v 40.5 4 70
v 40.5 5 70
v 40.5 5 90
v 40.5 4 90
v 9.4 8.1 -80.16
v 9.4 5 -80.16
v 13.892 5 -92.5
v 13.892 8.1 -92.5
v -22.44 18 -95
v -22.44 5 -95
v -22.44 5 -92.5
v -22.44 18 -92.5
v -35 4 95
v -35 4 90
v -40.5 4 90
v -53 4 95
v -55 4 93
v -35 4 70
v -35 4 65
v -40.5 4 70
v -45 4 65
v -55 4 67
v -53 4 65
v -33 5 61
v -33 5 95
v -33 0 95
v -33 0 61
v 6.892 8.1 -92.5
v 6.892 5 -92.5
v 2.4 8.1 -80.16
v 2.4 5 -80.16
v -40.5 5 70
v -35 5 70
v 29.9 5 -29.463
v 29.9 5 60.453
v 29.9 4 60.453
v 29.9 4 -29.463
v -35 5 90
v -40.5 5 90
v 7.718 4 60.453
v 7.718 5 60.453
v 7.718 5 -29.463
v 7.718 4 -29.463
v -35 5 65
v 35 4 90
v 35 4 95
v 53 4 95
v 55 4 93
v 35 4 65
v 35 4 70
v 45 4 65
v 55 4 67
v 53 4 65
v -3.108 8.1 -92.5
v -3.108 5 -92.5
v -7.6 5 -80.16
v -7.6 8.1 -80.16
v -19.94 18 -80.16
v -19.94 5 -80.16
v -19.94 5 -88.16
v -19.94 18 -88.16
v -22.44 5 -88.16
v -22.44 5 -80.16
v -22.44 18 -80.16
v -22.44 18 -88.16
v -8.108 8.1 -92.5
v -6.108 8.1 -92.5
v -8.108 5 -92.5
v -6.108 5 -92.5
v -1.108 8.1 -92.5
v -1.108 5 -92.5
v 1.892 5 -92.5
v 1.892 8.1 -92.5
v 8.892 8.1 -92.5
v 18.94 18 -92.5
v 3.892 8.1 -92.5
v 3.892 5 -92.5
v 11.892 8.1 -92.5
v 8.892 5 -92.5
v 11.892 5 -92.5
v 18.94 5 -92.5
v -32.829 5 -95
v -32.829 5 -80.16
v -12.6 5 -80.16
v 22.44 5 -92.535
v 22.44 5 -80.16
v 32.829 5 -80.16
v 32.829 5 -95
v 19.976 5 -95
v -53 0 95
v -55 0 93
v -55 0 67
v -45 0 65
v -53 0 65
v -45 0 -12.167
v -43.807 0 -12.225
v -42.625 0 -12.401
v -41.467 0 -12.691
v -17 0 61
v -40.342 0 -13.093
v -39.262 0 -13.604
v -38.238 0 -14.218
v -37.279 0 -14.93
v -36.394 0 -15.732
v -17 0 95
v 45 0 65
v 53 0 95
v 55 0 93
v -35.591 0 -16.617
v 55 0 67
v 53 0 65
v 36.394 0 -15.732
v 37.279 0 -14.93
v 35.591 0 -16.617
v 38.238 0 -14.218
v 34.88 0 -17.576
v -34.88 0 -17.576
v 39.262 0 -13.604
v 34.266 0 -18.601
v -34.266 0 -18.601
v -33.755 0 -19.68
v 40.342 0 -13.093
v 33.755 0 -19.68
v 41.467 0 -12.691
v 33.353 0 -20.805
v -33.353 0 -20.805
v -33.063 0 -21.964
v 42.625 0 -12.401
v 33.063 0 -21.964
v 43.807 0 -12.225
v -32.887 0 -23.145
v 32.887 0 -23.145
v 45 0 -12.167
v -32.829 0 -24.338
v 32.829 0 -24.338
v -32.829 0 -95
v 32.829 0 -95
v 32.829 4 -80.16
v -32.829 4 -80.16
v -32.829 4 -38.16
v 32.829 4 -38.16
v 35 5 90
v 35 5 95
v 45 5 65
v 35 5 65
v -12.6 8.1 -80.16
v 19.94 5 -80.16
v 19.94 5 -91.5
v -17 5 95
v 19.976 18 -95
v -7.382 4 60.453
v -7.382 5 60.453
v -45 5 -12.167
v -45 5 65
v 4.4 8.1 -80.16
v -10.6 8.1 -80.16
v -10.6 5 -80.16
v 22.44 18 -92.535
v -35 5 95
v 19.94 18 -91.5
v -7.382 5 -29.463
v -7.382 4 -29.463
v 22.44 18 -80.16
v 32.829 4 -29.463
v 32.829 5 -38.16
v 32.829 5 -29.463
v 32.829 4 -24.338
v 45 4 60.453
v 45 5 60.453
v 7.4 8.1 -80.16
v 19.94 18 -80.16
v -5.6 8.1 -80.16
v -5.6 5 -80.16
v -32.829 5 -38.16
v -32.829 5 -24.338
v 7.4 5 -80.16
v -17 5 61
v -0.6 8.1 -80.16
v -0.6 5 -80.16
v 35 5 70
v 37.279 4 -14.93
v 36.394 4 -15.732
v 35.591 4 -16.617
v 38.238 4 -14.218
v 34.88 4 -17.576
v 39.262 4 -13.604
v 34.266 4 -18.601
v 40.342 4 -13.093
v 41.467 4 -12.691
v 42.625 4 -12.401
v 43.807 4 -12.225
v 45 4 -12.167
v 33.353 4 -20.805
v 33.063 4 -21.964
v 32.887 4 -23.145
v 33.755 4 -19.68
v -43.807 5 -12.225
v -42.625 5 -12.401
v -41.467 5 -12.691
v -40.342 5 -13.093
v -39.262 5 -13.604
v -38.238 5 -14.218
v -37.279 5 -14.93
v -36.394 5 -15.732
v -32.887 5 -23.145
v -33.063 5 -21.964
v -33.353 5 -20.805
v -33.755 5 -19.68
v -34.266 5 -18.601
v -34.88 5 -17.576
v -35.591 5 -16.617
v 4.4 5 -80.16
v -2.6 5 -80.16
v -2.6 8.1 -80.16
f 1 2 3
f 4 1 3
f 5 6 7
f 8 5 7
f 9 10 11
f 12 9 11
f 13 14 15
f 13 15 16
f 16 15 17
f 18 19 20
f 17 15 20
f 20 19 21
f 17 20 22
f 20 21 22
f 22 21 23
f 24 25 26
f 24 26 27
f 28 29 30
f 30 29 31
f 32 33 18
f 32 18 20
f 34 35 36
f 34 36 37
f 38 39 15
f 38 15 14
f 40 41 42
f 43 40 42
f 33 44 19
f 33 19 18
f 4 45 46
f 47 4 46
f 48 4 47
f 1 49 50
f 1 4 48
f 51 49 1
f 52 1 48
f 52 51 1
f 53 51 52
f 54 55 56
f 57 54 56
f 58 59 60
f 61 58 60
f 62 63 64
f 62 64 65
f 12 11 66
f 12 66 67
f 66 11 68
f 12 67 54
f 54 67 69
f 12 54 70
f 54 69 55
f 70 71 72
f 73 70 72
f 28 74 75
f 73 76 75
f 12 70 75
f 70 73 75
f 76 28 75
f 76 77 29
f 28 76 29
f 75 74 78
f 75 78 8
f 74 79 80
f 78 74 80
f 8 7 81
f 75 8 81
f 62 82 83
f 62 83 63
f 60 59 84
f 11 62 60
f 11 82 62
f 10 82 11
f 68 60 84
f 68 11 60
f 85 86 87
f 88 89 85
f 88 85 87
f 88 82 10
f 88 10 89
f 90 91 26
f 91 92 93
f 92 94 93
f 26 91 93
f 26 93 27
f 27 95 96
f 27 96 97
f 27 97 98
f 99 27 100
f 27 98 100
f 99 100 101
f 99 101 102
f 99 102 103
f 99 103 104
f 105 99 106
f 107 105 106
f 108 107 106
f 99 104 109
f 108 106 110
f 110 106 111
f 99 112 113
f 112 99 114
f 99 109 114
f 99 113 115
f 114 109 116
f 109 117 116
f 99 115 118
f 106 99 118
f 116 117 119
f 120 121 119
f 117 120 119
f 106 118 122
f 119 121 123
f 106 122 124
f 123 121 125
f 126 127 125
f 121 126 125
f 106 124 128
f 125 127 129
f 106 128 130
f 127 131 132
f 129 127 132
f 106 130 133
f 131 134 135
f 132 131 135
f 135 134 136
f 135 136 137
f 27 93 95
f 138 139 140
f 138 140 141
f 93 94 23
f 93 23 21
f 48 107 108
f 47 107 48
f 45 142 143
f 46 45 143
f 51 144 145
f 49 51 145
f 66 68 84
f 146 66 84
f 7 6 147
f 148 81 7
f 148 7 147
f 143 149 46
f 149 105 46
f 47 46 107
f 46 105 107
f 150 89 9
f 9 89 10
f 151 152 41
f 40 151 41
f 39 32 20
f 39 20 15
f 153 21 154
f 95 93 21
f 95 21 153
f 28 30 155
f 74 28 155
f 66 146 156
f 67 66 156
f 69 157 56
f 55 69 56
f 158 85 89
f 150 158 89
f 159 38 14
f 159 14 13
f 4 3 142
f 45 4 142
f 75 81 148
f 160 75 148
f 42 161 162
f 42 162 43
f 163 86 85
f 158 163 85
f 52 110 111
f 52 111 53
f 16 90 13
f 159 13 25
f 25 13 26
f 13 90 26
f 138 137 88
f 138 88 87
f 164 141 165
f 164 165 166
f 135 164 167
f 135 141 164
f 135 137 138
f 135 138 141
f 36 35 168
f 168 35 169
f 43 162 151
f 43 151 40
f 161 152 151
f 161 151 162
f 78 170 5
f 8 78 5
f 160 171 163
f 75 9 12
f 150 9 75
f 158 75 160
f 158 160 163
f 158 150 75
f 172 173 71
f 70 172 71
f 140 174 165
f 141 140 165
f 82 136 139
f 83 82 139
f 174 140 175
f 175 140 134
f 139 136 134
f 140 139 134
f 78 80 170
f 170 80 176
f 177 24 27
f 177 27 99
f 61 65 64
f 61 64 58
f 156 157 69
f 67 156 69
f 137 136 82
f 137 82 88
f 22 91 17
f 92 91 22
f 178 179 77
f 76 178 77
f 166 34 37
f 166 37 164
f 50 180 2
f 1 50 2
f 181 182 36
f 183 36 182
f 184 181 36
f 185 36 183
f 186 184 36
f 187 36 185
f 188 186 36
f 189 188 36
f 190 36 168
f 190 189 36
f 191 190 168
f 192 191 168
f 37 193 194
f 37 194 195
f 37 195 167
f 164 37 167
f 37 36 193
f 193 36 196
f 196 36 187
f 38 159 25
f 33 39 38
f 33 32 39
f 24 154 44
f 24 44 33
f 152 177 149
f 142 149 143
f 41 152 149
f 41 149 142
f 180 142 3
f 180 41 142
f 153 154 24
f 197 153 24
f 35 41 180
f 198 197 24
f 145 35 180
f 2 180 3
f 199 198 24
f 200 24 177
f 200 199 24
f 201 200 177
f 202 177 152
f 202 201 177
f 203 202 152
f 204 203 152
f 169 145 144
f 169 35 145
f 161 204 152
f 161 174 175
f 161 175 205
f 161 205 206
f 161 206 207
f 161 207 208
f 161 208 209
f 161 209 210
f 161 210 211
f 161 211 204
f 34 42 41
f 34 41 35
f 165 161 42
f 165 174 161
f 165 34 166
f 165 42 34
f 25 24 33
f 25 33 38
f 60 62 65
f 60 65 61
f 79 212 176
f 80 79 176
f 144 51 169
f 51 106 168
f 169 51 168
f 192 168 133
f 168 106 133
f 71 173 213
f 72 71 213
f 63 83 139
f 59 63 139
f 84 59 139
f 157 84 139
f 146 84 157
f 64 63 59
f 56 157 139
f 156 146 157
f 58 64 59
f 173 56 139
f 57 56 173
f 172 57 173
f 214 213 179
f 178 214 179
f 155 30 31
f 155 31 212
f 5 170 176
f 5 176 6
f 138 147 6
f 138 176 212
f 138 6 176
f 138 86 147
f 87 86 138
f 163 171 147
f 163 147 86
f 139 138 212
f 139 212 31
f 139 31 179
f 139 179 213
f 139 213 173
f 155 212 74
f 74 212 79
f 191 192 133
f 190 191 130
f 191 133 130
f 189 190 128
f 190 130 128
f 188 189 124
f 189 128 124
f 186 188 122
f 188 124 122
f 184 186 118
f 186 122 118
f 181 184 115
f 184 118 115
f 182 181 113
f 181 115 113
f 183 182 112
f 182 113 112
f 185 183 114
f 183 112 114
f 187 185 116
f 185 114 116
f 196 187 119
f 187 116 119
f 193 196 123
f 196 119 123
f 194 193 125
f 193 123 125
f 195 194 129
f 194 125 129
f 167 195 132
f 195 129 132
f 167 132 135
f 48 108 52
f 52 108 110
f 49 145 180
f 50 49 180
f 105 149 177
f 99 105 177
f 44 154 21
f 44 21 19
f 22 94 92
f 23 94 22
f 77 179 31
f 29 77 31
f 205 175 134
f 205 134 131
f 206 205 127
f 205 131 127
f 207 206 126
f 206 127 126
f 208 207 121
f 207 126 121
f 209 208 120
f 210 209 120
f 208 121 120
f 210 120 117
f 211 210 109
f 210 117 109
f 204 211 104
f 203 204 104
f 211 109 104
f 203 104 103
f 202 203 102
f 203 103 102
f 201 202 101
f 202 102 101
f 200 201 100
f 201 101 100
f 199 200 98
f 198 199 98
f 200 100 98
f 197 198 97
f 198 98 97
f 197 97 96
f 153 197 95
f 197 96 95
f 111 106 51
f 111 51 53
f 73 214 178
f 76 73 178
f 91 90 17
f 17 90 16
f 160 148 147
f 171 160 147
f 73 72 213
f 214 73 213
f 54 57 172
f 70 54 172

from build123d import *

# Parameters (mm, degrees)
SKETCH1_W                = 90
SKETCH1_H                = 190
BOSS_EXTRUDE1_DEPTH      = 5
SKETCH2_W                = 10
SKETCH2_H                = 30
BOSS_EXTRUDE2_DEPTH      = 5
CHAMFER1_SIZE            = 2
SKETCH3_W                = 16
SKETCH3_H                = 34
CUT_EXTRUDE1_DEPTH       = 50
SKETCH4_W                = 90
SKETCH4_H                = 42
CUT_EXTRUDE2_DEPTH       = 1
SKETCH7_W                = 15.1
SKETCH7_H                = 89.916335477
CUT_EXTRUDE7_DEPTH       = 1
CUT_EXTRUDE9_DEPTH       = 110.886304879
CUT_EXTRUDE9_DEPTH_BACK  = 110.886304879
CUT_EXTRUDE10_DEPTH      = 110.886304879
CUT_EXTRUDE10_DEPTH_BACK = 110.886304879
BOSS_EXTRUDE4_START      = 5
SKETCH17_W               = 2.5
SKETCH17_H               = 8
BOSS_EXTRUDE4_DEPTH      = 13
BOSS_EXTRUDE5_DEPTH      = 3.1
CUT_EXTRUDE11_START      = 5
CUT_EXTRUDE11_DEPTH      = 1


with BuildPart() as part:
    # Sketch1 → Boss-Extrude1 (new body)
    with BuildSketch(Plane(origin=(0, 0, 0), x_dir=(1, 0, 0), z_dir=(0, 1, 0))):
        Rectangle(SKETCH1_W, SKETCH1_H)
    extrude(amount=BOSS_EXTRUDE1_DEPTH)

    # Sketch2 → Boss-Extrude2 (add)
    with BuildSketch(Plane(origin=(0, 0, 0), x_dir=(1, 0, 0), z_dir=(0, 1, 0))):
        with Locations((-50, -80)):
            Rectangle(SKETCH2_W, SKETCH2_H)
        with Locations((50, -80)):
            Rectangle(SKETCH2_W, SKETCH2_H)
    extrude(amount=BOSS_EXTRUDE2_DEPTH)

    # Chamfer1
    chamfer1_edges = [part.edges().sort_by_distance(p)[0] for p in [
        (-55, 2.5, 65),
        (-55, 2.5, 95),
        (55, 2.5, 95),
        (55, 2.5, 65),
    ]]
    chamfer(chamfer1_edges, length=CHAMFER1_SIZE)

    # Sketch3 → Cut-Extrude1 (cut)
    with BuildSketch(Plane(origin=(0, 5, 0), x_dir=(1, 0, 0), z_dir=(0, 1, 0))):
        with Locations((-25, -78)):
            Rectangle(SKETCH3_W, SKETCH3_H)
    extrude(amount=-CUT_EXTRUDE1_DEPTH, mode=Mode.SUBTRACT)

    # Sketch4 → Cut-Extrude2 (cut)
    with BuildSketch(Plane(origin=(0, 5, 0), x_dir=(1, 0, 0), z_dir=(0, 1, 0))):
        with Locations((0, 59.159820088)):
            Rectangle(SKETCH4_W, SKETCH4_H)
    extrude(amount=-CUT_EXTRUDE2_DEPTH, mode=Mode.SUBTRACT)

    # Sketch7 → Cut-Extrude7 (cut)
    with BuildSketch(Plane(origin=(0, 5, 0), x_dir=(1, 0, 0), z_dir=(0, 1, 0))):
        with Locations((37.45, -15.495273531)):
            Rectangle(SKETCH7_W, SKETCH7_H)
        with Locations((0.16773297, -15.495273531)):
            Rectangle(SKETCH7_W, SKETCH7_H)
    extrude(amount=-CUT_EXTRUDE7_DEPTH, mode=Mode.SUBTRACT)

    # Sketch14 → Cut-Extrude9 (cut, two sides: drawn at the far end of the back side and taken through both)
    with BuildSketch(Plane(origin=(0, 0, 0), x_dir=(1, 0, 0), z_dir=(0, 1, 0)).offset(-CUT_EXTRUDE9_DEPTH_BACK)):
        with BuildLine():
            Line((-45, 47.267125731), (-34.685032462, 30.799006468))
            ThreePointArc((-34.685032462, 30.799006468), (-34.351546651, 18.443044928), (-45, 12.166784925))
            Line((-45, 12.166784925), (-45, 47.267125731))
        make_face()
        with BuildLine():
            Line((45, 47.267125731), (45, 12.166784925))
            ThreePointArc((45, 12.166784925), (34.351546651, 18.443044928), (34.685032462, 30.799006468))
            Line((34.685032462, 30.799006468), (45, 47.267125731))
        make_face()
    extrude(amount=CUT_EXTRUDE9_DEPTH + CUT_EXTRUDE9_DEPTH_BACK, mode=Mode.SUBTRACT)

    # Sketch16 → Cut-Extrude10 (cut, two sides: drawn at the far end of the back side and taken through both)
    with BuildSketch(Plane(origin=(0, 0, 0), x_dir=(1, 0, 0), z_dir=(0, 1, 0)).offset(-CUT_EXTRUDE10_DEPTH_BACK)):
        with BuildLine():
            Line((-32.828659242, 95), (-32.828659242, 24.338125683))
            ThreePointArc((-32.828659242, 24.338125683), (-33.30195485, 27.699267678), (-34.685032462, 30.799006468))
            Line((-34.685032462, 30.799006468), (-45, 47.267125731))
            Line((-45, 47.267125731), (-45, 95))
            Line((-45, 95), (-32.828659242, 95))
        make_face()
        with BuildLine():
            Line((45, 95), (32.828659242, 95))
            Line((32.828659242, 95), (32.828659242, 24.338125683))
            ThreePointArc((32.828659242, 24.338125683), (33.30195485, 27.699267678), (34.685032462, 30.799006468))
            Line((34.685032462, 30.799006468), (45, 47.267125731))
            Line((45, 47.267125731), (45, 95))
        make_face()
    extrude(amount=CUT_EXTRUDE10_DEPTH + CUT_EXTRUDE10_DEPTH_BACK, mode=Mode.SUBTRACT)

    # Sketch17 → Boss-Extrude4 (add)
    with BuildSketch(Plane(origin=(0, 0, 0), x_dir=(1, 0, 0), z_dir=(0, 1, 0)).offset(BOSS_EXTRUDE4_START)):
        with Locations((-21.190023983, 84.159820088)):
            Rectangle(SKETCH17_W, SKETCH17_H)
        Polygon((-22.440023983, 94.999820088), (-22.440023983, 92.499820088), (18.940023983, 92.499820088), (19.940023983, 91.499820088), (19.940023983, 80.159820088), (22.440023983, 80.159820088), (22.440023983, 92.535353994), (19.975557889, 94.999820088), align=None)
    extrude(amount=BOSS_EXTRUDE4_DEPTH)

    # Sketch18 → Boss-Extrude5 (add)
    with BuildSketch(Plane(origin=(0, 5, 0), x_dir=(1, 0, 0), z_dir=(0, 1, 0))):
        Polygon((-12.599634528, 80.159820088), (-10.599634528, 80.159820088), (-6.108241837, 92.499820088), (-8.108241837, 92.499820088), align=None)
        Polygon((-3.108241837, 92.499820088), (-7.599634528, 80.159820088), (-5.599634528, 80.159820088), (-1.108241837, 92.499820088), align=None)
        Polygon((1.891758163, 92.499820088), (-2.599634528, 80.159820088), (-0.599634528, 80.159820088), (3.891758163, 92.499820088), align=None)
        Polygon((6.891758163, 92.499820088), (2.400365472, 80.159820088), (4.400365472, 80.159820088), (8.891758163, 92.499820088), align=None)
        Polygon((11.891758163, 92.499820088), (7.400365472, 80.159820088), (9.400365472, 80.159820088), (13.891758163, 92.499820088), align=None)
    extrude(amount=BOSS_EXTRUDE5_DEPTH)

    # Sketch19 → Cut-Extrude11 (cut)
    with BuildSketch(Plane(origin=(0, 0, 0), x_dir=(1, 0, 0), z_dir=(0, 1, 0)).offset(CUT_EXTRUDE11_START)):
        Polygon((-35, -65), (-35, -70), (-40.5, -70), (-40.5, -90), (-35, -90), (-35, -95), (-53, -95), (-55, -93), (-55, -67), (-53, -65), align=None)
    cut_extrude11 = extrude(amount=-CUT_EXTRUDE11_DEPTH, mode=Mode.SUBTRACT)

    # Mirror1: Cut-Extrude11 across plane
    add(cut_extrude11.mirror(Plane(origin=(0, 0, 0), x_dir=(0, 0, 1), z_dir=(1, 0, 0))), mode=Mode.SUBTRACT)


solid = part.part
